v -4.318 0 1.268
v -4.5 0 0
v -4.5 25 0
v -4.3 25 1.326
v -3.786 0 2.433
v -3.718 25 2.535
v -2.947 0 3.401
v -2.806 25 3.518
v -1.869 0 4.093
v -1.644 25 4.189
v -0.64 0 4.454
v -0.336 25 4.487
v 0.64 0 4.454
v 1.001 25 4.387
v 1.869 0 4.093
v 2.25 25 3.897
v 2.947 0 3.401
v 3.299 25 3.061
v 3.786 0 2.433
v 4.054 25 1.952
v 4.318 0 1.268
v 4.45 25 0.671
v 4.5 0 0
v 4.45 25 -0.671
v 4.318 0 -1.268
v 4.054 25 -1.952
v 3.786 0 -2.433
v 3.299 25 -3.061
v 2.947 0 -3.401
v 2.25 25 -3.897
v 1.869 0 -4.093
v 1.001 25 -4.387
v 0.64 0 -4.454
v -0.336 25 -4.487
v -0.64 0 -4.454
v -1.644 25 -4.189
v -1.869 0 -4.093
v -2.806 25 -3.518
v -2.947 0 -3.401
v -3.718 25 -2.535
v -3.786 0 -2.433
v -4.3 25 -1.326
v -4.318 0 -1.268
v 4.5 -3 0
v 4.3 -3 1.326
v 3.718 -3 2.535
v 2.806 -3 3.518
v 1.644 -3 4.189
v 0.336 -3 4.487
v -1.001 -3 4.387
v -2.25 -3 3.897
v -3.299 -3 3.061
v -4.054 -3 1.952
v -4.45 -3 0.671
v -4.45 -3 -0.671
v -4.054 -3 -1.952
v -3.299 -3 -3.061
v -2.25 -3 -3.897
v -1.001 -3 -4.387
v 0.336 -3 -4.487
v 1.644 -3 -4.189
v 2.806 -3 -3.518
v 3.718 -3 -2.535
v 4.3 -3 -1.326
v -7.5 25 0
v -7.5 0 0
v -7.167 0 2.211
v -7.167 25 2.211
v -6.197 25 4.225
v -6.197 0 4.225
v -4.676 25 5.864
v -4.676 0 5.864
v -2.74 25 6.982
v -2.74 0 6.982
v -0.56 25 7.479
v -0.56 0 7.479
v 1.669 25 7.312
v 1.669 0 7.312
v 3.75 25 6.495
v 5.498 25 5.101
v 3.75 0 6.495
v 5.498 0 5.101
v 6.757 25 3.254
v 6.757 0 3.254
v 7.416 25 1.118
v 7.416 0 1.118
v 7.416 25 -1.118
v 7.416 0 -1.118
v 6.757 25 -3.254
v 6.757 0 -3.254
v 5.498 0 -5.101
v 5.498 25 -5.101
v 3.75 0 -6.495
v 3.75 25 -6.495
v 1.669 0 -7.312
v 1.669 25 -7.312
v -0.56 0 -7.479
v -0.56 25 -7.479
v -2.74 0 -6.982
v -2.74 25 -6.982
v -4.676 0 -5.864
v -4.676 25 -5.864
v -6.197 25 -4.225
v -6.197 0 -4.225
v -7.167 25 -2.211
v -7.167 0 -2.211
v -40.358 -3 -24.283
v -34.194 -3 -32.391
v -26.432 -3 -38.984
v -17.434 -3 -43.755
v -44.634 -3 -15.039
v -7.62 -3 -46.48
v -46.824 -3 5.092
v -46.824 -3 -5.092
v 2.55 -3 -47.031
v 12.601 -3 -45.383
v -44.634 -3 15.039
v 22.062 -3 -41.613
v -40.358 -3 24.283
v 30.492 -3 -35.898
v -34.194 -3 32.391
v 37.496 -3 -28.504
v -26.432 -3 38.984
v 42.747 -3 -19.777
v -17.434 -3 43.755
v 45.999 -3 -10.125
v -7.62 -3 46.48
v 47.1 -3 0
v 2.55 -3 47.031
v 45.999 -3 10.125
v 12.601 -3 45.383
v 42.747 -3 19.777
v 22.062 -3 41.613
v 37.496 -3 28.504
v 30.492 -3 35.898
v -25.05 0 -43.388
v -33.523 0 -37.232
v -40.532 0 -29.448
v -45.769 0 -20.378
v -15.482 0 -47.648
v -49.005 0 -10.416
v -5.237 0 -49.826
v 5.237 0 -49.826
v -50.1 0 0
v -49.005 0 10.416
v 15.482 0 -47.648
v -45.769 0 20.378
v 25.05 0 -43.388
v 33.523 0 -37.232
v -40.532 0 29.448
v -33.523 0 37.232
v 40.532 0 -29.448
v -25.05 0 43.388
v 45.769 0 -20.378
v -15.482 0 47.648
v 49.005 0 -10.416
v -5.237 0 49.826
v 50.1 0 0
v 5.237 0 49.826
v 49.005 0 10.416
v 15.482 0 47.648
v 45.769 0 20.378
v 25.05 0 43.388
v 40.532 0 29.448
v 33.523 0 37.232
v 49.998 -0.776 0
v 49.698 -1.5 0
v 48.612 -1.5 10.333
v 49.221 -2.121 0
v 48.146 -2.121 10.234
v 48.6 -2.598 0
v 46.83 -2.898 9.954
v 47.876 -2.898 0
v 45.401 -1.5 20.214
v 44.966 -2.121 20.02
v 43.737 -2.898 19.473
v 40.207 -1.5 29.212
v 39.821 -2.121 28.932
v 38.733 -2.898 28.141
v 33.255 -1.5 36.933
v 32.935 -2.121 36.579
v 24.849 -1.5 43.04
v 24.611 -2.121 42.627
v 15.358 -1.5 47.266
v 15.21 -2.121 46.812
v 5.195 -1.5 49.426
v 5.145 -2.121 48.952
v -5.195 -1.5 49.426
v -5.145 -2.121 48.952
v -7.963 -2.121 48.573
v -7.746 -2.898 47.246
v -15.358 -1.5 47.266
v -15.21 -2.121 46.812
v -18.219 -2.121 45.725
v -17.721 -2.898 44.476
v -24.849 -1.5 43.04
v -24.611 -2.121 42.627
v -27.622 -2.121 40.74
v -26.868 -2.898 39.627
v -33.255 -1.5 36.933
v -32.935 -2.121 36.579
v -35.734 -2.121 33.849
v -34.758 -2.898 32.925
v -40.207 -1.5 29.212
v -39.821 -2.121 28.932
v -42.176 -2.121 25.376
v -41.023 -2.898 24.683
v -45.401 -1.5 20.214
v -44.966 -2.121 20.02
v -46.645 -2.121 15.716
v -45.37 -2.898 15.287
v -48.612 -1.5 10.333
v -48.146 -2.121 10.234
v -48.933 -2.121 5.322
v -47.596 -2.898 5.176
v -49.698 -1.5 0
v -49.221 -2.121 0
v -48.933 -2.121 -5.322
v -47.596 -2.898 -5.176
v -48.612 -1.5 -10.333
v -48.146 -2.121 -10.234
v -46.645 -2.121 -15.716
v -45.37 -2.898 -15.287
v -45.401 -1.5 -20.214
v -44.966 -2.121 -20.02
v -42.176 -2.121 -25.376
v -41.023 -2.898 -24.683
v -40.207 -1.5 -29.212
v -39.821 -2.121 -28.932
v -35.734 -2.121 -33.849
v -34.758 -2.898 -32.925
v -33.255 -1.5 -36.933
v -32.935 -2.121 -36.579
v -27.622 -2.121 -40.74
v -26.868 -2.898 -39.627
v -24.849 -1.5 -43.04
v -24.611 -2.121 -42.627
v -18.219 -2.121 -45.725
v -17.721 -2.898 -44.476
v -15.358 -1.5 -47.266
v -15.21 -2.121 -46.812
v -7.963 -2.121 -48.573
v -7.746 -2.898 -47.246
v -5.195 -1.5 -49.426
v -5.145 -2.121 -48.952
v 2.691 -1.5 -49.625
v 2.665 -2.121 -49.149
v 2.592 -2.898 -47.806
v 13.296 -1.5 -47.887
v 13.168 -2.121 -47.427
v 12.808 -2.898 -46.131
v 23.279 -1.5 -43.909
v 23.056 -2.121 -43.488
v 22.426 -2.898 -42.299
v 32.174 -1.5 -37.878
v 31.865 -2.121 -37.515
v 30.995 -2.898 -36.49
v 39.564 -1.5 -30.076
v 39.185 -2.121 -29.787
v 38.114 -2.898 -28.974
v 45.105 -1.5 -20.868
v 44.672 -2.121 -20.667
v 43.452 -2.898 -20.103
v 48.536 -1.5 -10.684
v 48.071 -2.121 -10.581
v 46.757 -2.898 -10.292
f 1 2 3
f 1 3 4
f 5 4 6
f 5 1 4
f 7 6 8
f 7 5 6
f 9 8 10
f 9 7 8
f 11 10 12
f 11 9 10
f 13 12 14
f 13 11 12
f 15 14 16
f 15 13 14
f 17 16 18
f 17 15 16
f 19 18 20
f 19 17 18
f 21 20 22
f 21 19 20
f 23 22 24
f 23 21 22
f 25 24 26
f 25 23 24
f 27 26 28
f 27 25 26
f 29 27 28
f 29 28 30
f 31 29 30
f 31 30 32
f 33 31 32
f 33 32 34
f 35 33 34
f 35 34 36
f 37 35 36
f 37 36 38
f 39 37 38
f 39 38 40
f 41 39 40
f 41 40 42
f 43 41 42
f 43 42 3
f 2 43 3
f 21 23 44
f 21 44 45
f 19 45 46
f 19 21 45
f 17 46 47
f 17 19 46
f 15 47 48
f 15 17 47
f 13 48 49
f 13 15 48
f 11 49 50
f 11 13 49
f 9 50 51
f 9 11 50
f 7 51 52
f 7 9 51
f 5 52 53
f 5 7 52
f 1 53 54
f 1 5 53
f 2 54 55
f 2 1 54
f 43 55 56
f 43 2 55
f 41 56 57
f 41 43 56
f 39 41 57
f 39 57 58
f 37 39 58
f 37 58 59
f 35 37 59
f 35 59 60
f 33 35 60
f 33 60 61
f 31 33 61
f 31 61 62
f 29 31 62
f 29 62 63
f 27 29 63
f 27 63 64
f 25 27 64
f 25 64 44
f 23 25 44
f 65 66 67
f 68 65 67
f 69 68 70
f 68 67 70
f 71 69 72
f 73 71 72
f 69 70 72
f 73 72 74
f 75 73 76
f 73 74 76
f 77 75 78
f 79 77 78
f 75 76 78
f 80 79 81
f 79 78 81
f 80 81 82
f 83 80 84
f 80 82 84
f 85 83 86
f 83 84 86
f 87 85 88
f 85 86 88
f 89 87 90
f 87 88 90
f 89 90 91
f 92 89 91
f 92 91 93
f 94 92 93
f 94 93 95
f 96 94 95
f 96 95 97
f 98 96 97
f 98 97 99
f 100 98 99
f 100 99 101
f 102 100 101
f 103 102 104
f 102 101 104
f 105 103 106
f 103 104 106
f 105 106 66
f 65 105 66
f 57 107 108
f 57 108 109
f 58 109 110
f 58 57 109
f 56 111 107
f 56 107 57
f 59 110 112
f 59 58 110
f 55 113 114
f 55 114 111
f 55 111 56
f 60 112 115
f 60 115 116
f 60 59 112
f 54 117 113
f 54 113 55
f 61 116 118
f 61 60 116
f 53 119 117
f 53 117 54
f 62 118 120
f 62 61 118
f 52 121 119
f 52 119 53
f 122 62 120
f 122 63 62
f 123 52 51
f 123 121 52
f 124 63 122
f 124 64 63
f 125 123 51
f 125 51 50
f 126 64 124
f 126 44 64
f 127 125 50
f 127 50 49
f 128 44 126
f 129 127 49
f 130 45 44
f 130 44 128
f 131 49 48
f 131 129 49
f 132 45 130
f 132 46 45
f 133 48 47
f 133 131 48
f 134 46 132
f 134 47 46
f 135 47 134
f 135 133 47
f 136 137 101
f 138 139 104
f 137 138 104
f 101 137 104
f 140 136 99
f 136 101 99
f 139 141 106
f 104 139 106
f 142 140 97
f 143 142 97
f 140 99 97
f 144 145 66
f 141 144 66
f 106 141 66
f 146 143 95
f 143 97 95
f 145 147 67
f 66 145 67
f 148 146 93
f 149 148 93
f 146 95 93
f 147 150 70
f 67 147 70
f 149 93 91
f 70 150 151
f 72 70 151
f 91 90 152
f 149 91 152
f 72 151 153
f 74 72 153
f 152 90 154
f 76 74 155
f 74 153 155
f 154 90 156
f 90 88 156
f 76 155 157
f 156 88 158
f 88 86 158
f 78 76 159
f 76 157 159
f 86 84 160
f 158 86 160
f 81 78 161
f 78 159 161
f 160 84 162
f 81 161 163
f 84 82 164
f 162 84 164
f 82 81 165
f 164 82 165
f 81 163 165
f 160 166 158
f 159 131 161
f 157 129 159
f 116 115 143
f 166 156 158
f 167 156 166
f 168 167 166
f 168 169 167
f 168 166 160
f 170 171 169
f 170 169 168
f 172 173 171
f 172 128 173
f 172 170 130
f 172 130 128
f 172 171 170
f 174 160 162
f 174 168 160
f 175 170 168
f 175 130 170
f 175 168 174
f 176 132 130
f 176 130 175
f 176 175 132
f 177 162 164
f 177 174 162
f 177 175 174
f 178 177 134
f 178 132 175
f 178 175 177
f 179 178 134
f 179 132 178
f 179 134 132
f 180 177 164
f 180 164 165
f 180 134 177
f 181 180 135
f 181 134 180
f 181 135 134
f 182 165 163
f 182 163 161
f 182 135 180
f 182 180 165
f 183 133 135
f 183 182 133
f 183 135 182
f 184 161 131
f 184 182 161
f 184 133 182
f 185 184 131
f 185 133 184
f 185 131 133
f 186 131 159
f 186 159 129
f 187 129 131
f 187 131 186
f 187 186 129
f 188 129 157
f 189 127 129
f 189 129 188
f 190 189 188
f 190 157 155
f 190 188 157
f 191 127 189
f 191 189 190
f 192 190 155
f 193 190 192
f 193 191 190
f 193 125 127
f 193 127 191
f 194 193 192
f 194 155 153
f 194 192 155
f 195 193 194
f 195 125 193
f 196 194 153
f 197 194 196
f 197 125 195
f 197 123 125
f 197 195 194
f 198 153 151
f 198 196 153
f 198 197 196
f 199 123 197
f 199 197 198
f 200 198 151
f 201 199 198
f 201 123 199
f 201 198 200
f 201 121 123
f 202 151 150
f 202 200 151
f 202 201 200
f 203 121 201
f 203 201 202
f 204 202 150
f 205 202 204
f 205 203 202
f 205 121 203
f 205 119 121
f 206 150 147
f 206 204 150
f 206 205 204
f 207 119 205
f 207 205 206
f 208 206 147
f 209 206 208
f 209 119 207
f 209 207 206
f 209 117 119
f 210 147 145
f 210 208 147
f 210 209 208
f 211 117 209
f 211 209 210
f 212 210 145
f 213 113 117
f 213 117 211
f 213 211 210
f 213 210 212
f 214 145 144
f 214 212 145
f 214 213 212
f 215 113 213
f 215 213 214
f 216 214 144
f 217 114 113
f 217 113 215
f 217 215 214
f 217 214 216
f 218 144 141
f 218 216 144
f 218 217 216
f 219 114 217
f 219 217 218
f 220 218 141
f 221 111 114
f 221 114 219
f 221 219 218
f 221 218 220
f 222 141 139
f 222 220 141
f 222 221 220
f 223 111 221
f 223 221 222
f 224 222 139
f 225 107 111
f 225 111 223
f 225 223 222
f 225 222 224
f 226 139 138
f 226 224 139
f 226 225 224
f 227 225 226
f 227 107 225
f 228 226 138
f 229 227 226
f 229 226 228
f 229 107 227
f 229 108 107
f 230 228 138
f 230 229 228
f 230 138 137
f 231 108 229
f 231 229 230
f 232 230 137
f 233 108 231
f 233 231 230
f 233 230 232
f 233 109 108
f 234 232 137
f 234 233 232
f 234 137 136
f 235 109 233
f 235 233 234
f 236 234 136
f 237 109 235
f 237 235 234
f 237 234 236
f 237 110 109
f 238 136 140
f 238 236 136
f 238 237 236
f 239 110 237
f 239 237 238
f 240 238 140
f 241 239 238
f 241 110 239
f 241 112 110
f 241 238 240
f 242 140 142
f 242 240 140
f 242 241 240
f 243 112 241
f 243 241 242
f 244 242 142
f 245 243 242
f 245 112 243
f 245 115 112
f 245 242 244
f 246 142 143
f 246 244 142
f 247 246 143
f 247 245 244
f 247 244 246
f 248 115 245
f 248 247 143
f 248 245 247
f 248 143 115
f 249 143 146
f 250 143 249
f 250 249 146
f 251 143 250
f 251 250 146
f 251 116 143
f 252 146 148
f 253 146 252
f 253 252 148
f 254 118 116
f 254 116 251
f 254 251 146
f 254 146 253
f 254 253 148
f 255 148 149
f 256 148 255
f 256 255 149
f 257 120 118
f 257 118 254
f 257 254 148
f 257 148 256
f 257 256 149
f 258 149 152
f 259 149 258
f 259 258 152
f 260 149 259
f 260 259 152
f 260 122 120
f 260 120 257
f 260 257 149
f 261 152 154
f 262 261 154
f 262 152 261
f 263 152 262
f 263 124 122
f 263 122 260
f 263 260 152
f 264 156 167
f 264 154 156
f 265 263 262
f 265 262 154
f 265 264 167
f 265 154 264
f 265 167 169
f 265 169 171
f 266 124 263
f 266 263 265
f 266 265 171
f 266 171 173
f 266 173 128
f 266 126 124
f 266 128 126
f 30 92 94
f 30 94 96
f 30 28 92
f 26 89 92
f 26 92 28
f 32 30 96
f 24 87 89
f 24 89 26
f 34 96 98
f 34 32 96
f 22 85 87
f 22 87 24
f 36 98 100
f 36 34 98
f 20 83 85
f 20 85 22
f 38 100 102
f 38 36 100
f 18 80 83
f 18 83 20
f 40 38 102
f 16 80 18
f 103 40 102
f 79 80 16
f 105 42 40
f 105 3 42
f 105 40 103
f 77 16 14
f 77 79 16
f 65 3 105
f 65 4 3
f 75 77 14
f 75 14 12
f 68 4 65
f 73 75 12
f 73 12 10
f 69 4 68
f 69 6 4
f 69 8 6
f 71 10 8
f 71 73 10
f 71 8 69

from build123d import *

# Parameters (mm, degrees)
F0_R     = 50.1
F0_R_2   = 4.5
F1_DEPTH = 3
F2_R     = 7.5
F2_R_2   = 4.5
F3_DEPTH = 25
F4_R     = 2.99999


# Not quite as in the source:
# - a fillet or chamfer is up to 0.001 mm smaller than in the source, because OpenCascade refuses the exact size


with BuildPart() as f1:
    # F0 (on Front) → F1 (new body)
    with BuildSketch(Plane.XZ):
        Circle(F0_R)
        Circle(F0_R_2, mode=Mode.SUBTRACT)
    extrude(amount=F1_DEPTH)

    # F2 (on face) → F3 (join)
    with BuildSketch(Plane(origin=(0, 0, 0), x_dir=(-1, 0, 0), z_dir=(0, 1, 0))):
        Circle(F2_R)
        Circle(F2_R_2, mode=Mode.SUBTRACT)
    extrude(amount=F3_DEPTH)

    # F4 (radius 3 in the source; OpenCascade refuses exactly that, so slightly less here)
    f4_edges = [f1.edges().sort_by_distance(p)[0] for p in [
        (-50.1, -3, 0),
    ]]
    fillet(f4_edges, radius=F4_R)


solid = f1.part
